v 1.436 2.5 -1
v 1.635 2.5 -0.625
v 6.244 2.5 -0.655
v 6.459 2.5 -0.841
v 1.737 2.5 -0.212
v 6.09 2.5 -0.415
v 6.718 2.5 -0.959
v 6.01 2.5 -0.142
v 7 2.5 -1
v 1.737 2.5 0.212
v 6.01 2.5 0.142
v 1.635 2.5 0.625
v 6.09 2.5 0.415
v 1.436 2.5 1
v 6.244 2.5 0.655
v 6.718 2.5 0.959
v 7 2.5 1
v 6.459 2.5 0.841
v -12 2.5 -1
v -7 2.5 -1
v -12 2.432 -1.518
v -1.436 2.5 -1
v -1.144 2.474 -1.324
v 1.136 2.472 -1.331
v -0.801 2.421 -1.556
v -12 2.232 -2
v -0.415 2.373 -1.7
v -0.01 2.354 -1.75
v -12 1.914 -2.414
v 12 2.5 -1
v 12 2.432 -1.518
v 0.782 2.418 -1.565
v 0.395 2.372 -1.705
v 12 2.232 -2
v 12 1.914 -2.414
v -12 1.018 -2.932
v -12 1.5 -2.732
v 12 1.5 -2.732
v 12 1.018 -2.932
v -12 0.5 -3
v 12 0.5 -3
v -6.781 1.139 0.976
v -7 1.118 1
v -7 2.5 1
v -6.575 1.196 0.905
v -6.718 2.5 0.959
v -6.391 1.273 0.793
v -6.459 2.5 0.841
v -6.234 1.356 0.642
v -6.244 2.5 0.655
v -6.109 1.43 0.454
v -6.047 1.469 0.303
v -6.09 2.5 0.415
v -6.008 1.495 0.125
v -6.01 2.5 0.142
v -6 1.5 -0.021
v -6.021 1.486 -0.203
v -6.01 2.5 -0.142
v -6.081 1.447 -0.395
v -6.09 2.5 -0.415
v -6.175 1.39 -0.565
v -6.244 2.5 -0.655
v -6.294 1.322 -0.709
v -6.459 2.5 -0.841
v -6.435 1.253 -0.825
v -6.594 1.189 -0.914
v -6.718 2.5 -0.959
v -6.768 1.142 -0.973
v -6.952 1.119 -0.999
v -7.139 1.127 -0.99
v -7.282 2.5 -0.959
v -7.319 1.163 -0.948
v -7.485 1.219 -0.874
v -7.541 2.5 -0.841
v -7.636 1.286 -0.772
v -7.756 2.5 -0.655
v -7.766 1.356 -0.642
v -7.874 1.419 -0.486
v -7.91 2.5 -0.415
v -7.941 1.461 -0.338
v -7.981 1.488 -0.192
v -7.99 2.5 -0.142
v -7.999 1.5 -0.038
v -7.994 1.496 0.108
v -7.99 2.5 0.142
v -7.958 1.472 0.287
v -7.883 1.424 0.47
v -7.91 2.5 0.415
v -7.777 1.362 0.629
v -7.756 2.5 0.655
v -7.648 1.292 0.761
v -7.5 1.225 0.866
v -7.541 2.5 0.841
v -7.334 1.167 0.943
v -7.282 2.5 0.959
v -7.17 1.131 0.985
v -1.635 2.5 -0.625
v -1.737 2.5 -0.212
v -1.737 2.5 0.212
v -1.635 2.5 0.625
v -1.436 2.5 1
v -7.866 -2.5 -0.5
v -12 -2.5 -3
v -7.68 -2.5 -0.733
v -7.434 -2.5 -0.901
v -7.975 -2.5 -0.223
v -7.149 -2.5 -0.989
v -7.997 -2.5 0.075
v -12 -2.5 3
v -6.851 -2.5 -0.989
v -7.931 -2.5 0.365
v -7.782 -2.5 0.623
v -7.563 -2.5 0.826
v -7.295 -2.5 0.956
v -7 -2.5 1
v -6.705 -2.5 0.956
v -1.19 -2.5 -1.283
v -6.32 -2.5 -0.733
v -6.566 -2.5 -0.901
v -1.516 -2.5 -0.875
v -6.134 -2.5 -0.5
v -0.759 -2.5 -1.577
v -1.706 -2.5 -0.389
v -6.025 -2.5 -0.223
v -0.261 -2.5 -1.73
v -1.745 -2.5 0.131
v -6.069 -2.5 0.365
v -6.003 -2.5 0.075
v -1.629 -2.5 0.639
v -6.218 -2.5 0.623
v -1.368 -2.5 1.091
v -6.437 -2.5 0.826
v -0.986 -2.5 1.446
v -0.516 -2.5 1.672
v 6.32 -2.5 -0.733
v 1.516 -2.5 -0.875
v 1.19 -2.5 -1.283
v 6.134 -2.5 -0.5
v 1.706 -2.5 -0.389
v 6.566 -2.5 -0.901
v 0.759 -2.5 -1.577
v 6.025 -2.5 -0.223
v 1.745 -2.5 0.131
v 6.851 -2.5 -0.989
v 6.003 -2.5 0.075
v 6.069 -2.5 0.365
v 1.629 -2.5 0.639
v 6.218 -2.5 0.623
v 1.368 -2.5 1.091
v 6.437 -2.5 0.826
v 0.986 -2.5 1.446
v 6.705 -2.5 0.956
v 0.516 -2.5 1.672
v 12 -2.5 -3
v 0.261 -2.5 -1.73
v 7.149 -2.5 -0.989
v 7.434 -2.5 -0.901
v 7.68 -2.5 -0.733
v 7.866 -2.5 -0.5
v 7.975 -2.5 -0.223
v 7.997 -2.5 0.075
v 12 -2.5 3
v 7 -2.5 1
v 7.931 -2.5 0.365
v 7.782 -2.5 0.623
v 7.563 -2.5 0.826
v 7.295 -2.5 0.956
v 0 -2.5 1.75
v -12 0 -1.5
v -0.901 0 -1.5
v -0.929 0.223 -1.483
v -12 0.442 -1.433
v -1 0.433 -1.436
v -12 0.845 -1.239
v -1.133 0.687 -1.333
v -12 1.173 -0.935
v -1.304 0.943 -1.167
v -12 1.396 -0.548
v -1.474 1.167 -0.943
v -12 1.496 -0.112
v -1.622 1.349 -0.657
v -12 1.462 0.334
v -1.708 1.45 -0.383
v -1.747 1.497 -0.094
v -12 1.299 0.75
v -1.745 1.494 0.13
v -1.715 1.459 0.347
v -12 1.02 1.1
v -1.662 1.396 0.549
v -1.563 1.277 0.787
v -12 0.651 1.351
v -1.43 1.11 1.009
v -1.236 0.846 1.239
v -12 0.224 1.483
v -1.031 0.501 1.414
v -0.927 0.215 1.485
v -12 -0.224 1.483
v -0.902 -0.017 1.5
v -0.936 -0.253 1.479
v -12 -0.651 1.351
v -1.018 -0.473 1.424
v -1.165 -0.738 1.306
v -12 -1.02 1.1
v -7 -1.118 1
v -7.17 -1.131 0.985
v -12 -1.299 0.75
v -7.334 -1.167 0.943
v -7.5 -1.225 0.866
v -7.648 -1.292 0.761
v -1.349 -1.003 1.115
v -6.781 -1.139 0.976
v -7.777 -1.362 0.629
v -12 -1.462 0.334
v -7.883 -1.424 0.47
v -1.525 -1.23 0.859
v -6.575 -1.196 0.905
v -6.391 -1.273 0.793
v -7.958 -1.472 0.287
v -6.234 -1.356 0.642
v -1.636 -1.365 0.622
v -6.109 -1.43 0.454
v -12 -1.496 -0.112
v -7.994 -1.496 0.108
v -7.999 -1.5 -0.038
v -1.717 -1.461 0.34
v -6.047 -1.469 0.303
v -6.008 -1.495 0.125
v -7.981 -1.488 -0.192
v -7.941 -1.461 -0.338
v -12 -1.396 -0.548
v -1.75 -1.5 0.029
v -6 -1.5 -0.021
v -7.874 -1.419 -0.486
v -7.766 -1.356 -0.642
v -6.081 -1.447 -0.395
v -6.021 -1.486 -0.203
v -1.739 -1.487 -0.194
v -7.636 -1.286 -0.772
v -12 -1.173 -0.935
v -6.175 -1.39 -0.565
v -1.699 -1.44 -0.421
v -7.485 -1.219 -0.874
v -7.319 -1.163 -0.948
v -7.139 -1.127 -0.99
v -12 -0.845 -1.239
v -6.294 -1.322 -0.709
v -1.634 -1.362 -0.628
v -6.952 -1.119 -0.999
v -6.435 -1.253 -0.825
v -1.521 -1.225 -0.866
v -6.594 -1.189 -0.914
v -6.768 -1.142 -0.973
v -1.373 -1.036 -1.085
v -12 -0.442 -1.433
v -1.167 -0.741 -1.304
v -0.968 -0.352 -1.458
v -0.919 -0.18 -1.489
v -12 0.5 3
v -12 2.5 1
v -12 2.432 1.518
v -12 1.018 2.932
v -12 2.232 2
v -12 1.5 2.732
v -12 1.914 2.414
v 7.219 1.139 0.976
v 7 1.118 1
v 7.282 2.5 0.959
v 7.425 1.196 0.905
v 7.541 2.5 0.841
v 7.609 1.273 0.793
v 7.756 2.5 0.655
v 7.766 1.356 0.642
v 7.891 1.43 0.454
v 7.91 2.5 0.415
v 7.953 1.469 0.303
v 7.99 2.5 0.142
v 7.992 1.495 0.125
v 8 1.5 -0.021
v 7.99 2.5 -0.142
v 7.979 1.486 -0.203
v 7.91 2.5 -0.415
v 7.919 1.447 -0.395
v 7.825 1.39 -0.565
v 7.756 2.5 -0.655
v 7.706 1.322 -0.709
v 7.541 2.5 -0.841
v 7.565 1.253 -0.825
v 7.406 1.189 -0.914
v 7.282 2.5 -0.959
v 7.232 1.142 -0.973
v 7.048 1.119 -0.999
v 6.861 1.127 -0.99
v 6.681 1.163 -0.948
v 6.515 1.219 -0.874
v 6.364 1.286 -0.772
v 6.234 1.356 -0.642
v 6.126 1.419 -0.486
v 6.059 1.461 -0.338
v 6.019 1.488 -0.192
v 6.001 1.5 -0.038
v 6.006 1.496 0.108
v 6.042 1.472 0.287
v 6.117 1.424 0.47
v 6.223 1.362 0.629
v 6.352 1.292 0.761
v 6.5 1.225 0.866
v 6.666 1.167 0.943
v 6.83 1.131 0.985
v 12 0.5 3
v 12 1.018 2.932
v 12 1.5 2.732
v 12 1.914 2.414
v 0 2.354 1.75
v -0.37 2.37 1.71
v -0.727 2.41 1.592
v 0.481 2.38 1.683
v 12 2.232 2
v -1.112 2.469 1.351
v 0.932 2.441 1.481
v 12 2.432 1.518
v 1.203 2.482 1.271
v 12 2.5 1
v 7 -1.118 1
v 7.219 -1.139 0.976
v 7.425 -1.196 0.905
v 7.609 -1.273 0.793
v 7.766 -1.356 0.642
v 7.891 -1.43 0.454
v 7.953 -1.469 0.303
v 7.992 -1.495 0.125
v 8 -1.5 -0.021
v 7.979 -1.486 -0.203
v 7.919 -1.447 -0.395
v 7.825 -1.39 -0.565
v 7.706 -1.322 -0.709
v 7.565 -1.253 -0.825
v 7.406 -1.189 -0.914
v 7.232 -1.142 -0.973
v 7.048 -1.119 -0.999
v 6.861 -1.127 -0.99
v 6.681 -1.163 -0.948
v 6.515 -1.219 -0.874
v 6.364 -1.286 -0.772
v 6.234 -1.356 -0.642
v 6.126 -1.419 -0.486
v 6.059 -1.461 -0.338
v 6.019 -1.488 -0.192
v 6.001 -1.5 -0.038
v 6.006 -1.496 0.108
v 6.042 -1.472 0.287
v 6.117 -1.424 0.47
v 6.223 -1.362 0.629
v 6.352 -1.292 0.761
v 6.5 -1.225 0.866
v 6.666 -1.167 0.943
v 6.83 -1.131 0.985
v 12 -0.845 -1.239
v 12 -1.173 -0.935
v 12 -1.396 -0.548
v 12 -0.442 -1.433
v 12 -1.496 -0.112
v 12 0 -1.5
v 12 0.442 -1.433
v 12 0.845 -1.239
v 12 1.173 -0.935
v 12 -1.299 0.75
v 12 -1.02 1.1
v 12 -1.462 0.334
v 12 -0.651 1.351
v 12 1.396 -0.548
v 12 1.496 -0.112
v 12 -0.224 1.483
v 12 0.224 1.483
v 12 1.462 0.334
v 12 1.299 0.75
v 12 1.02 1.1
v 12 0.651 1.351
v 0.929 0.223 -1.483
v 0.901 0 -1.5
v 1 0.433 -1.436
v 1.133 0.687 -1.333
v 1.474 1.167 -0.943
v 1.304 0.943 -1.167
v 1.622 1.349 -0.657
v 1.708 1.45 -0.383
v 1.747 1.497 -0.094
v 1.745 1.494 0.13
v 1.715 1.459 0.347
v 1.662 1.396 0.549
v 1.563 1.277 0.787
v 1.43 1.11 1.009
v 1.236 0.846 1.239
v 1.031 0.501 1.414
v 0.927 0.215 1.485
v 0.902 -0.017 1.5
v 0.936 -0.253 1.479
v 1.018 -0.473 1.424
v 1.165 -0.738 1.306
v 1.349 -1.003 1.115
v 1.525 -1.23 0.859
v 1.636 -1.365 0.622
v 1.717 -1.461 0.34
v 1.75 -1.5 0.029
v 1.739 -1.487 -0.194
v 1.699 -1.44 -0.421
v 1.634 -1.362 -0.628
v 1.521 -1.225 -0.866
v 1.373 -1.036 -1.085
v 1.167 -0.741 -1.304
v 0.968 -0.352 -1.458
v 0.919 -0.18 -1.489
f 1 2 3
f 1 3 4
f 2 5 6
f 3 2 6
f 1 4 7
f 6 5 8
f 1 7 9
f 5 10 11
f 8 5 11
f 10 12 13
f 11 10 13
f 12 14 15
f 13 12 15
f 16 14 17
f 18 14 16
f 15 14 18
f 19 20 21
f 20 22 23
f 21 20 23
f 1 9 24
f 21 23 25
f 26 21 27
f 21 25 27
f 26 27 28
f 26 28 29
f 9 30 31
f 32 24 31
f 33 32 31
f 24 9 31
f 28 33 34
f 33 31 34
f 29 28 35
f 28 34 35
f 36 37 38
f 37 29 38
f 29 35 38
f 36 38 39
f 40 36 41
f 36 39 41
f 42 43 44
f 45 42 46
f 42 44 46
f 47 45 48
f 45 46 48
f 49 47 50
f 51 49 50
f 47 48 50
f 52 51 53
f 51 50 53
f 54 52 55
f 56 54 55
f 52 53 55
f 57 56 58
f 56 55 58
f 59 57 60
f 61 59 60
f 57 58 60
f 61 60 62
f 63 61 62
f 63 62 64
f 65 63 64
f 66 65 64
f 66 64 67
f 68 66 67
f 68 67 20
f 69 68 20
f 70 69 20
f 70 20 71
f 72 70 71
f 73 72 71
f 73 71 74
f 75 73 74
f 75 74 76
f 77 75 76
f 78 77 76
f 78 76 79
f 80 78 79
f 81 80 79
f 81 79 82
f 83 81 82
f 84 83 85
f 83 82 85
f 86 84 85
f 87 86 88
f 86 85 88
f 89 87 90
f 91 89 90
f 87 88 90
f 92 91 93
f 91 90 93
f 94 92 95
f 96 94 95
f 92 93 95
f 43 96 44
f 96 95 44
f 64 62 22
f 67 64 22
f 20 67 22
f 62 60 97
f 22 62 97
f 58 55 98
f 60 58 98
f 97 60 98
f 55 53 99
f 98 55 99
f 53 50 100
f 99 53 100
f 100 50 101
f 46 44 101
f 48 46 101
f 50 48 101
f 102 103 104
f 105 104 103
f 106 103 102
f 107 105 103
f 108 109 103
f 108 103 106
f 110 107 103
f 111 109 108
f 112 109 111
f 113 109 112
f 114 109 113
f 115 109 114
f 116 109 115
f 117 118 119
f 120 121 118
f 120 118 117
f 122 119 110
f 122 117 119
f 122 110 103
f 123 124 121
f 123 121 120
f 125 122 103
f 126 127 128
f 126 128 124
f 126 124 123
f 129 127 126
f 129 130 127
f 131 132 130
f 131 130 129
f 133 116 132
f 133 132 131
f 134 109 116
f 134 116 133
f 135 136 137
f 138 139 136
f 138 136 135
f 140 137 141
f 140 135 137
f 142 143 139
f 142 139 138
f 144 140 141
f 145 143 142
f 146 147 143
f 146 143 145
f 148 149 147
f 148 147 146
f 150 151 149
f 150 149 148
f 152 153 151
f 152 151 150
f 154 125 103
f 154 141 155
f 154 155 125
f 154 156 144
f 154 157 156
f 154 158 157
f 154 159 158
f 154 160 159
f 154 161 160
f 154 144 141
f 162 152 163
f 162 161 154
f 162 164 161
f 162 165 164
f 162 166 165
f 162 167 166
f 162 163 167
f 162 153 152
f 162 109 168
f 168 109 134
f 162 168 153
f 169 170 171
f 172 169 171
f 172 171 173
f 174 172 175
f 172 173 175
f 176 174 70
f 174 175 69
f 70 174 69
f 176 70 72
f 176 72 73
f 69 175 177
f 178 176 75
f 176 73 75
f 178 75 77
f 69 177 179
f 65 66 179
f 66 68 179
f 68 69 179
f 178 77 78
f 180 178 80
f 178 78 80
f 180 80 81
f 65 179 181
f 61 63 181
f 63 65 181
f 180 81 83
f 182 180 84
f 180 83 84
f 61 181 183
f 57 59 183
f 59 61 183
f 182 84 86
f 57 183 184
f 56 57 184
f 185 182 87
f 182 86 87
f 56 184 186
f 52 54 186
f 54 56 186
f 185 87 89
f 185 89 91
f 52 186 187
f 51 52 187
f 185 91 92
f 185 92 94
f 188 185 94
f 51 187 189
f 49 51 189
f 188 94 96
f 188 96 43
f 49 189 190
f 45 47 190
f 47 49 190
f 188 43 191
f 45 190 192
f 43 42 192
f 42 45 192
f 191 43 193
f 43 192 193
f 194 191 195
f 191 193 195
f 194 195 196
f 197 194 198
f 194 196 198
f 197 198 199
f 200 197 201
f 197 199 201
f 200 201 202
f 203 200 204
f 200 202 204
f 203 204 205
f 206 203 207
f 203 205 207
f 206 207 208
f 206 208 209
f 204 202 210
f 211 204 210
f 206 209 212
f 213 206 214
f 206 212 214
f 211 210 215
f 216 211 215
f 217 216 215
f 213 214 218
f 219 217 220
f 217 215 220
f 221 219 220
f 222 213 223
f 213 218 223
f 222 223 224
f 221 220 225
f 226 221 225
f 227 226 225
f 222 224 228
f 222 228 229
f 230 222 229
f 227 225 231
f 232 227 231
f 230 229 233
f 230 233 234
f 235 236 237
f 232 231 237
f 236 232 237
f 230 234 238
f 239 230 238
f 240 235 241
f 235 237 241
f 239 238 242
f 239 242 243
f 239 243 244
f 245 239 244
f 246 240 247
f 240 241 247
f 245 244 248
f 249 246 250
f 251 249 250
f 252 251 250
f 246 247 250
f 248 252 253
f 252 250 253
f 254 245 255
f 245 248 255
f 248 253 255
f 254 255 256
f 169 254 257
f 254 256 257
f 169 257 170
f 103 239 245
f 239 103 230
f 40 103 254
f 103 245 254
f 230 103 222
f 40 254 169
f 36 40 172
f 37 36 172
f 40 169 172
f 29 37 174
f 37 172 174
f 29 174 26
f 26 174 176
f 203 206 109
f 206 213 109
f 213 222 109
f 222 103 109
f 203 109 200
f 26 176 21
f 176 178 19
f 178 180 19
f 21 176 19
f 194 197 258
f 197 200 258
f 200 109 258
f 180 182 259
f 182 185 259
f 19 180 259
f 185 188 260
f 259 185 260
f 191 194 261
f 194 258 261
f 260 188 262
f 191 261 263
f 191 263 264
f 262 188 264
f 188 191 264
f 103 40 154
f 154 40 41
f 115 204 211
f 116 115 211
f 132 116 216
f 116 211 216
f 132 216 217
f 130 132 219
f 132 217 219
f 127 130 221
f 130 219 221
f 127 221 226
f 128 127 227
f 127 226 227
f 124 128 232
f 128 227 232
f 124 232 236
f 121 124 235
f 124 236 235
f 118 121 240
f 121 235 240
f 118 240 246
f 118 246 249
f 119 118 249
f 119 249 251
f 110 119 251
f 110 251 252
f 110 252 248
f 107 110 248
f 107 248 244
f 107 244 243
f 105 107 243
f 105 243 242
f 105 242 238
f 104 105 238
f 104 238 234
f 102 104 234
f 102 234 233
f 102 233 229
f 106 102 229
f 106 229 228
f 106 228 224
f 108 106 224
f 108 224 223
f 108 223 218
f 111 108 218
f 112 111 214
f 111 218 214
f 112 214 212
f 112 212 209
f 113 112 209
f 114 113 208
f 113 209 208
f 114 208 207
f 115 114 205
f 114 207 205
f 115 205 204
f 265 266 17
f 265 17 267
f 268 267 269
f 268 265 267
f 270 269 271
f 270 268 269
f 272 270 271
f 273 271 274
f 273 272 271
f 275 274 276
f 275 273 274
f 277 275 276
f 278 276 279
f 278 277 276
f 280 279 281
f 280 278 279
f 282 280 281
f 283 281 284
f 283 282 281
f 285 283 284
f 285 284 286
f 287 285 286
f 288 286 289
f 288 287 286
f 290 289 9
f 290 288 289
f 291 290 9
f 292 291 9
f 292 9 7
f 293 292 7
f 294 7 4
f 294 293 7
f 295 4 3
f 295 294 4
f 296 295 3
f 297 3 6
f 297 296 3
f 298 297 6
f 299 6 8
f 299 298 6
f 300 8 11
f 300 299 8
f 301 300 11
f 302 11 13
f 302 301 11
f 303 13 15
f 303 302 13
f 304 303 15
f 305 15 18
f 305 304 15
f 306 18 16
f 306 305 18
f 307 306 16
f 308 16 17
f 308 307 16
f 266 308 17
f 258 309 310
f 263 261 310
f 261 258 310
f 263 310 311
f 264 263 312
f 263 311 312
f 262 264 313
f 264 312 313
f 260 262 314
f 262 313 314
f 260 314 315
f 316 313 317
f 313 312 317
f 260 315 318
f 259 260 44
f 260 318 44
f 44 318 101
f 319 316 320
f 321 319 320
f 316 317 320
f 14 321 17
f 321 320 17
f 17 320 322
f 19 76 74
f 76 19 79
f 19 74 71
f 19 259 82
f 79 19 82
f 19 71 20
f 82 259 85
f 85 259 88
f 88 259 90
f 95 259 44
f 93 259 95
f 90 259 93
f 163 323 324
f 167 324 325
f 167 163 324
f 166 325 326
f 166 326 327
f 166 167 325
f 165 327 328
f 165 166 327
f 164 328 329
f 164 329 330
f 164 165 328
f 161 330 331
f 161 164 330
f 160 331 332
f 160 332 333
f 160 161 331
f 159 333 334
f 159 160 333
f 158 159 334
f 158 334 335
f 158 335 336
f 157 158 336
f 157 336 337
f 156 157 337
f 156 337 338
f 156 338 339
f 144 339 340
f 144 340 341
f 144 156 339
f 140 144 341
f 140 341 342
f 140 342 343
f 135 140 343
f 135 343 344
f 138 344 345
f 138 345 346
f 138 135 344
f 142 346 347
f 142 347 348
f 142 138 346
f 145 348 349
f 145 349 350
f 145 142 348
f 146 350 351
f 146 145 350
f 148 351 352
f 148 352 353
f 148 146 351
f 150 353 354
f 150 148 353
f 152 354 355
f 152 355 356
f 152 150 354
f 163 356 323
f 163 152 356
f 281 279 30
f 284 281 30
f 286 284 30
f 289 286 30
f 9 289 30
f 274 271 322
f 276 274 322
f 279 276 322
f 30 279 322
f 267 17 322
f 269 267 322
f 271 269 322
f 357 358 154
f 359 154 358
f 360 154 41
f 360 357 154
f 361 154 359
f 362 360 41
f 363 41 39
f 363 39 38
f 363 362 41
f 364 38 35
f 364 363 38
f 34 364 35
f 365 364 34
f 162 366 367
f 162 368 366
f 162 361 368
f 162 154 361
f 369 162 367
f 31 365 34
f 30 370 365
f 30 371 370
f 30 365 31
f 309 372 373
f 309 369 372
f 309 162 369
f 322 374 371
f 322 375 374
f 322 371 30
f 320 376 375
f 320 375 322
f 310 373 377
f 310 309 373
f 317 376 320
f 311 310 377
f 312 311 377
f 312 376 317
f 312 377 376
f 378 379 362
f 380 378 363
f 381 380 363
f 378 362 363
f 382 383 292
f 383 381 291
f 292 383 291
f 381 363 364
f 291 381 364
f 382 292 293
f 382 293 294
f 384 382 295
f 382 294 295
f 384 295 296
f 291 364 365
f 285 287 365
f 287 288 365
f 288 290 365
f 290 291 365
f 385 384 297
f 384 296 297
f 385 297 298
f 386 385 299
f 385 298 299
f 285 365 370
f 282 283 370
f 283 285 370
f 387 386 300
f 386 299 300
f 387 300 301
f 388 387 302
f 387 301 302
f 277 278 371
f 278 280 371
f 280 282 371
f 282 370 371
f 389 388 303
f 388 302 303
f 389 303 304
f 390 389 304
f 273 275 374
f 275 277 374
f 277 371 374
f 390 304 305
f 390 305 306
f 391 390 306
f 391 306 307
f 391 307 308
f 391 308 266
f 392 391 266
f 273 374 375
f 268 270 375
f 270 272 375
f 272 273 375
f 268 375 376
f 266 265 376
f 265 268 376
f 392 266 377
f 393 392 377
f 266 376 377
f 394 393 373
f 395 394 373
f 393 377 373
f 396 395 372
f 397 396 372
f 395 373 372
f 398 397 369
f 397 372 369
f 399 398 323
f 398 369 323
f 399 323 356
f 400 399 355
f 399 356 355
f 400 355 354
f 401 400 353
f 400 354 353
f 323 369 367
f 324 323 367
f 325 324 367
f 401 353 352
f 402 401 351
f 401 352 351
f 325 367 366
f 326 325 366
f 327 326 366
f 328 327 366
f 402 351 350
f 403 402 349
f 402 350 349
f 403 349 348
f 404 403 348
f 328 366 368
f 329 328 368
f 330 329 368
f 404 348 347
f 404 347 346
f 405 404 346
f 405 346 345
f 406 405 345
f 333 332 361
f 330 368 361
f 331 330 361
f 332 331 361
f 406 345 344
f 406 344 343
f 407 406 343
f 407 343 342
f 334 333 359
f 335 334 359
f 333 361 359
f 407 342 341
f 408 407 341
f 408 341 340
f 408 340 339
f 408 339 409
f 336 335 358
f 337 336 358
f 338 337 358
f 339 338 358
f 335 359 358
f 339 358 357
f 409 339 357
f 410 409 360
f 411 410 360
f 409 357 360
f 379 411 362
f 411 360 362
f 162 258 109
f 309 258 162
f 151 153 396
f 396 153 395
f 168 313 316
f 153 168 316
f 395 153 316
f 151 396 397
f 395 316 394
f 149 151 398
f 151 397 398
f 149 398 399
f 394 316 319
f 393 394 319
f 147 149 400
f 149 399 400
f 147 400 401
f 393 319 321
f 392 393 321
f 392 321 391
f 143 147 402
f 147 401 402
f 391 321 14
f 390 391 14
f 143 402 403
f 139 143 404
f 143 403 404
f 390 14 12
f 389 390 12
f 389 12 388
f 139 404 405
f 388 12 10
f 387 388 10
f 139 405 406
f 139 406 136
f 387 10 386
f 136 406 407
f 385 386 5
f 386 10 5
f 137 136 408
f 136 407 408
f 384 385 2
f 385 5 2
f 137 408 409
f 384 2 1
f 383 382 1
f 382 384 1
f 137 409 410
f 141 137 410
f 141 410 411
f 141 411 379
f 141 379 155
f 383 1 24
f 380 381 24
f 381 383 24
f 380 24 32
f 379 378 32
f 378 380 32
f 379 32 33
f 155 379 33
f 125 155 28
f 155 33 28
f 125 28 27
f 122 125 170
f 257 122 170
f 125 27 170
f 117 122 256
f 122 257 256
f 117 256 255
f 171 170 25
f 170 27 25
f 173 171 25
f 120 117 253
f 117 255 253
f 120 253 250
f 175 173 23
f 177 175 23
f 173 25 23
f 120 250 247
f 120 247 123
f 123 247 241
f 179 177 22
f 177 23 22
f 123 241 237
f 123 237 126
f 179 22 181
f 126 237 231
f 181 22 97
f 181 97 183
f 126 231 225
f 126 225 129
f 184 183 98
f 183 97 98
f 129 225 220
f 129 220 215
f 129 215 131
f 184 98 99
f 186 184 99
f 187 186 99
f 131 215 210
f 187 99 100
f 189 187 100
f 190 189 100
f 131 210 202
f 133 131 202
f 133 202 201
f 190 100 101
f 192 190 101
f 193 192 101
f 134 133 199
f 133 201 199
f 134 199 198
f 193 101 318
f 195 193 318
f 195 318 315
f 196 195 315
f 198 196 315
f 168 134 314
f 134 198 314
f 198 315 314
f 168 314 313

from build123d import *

# Parameters (mm, degrees)
SKETCH_1_W          = 24
SKETCH_1_H          = 5
EXTRUDE_1_DEPTH     = 3
SKETCH_2_R          = 1.5
CUT_EXTRUDE_1_DEPTH = 25.315632832
SKETCH_3_R          = 1.75
CUT_EXTRUDE_2_DEPTH = 14.341664064
SKETCH_4_R          = 1
CUT_EXTRUDE_3_DEPTH = 14.341664192
SKETCH_5_R          = 1
EXTRUDE_3_DEPTH     = 2
SKETCH_6_W          = 2
SKETCH_6_H          = 0.5
CUT_EXTRUDE_7_DEPTH = 3
CUT_EXTRUDE_START   = -10
SKETCH_8_R          = 1
CUT_EXTRUDE_9_DEPTH = 10
FILLET_2_R          = 2


with BuildPart() as part:
    # 草图1 → 凸台-拉伸1 (new, symmetric)
    with BuildSketch(Plane.XY):
        Rectangle(SKETCH_1_W, SKETCH_1_H)
    extrude(amount=EXTRUDE_1_DEPTH, both=True)

    # 草图2 → 切除-拉伸1 (cut, through all)
    with BuildSketch(Plane(origin=(12, 0, 0), x_dir=(0, 0, -1), z_dir=(1, 0, 0))):
        Circle(SKETCH_2_R)
    extrude(amount=-CUT_EXTRUDE_1_DEPTH, mode=Mode.SUBTRACT)

    # 草图3 → 切除-拉伸2 (cut, through all)
    with BuildSketch(Plane(origin=(0, 2.5, 0), x_dir=(1, 0, 0), z_dir=(0, 1, 0))):
        with Locations(Location((0, 0, 0), (0, 0, 270))):
            Circle(SKETCH_3_R)
    extrude(amount=-CUT_EXTRUDE_2_DEPTH, mode=Mode.SUBTRACT)

    # 草图4 → 切除-拉伸3 (cut, through all)
    with BuildSketch(Plane(origin=(0, 2.5, 0), x_dir=(1, 0, 0), z_dir=(0, 1, 0))):
        with Locations(Location((-7, 0, 0), (0, 0, 270))):
            Circle(SKETCH_4_R)
    extrude(amount=-CUT_EXTRUDE_3_DEPTH, mode=Mode.SUBTRACT)

    # 草图5 → 凸台-拉伸3 (add)
    with BuildSketch(Plane(origin=(0, 2.5, 0), x_dir=(1, 0, 0), z_dir=(0, 1, 0))):
        with Locations(Location((7, 0, 0), (0, 0, 270))):
            Circle(SKETCH_5_R)
    extrude(amount=EXTRUDE_3_DEPTH)

    # 草图6 → 切除-拉伸7 (cut)
    with BuildSketch(Plane(origin=(0, 0, -3), x_dir=(-1, 0, 0), z_dir=(0, 0, -1))):
        with Locations((-7, 3.25)):
            Rectangle(SKETCH_6_W, SKETCH_6_H)
    extrude(amount=-CUT_EXTRUDE_7_DEPTH, mode=Mode.SUBTRACT)

    # 草图8 → 切除-拉伸9 (cut)
    with BuildSketch(Plane(origin=(0, 4.5, 0), x_dir=(1, 0, 0), z_dir=(0, 1, 0)).offset(CUT_EXTRUDE_START)):
        with Locations(Location((7, 0, 0), (0, 0, 270))):
            Circle(SKETCH_8_R)
    extrude(amount=CUT_EXTRUDE_9_DEPTH, mode=Mode.SUBTRACT)

    # 圆角2
    # the kernel refuses this fillet: 2 mm, written as the material it takes off along each edge
    with BuildSketch(Plane(origin=(17, 2.5, -3), x_dir=(0, -1, 0), z_dir=(-1, 0, 0))) as fillet_2_piece_1:
        with BuildLine():
            CenterArc((FILLET_2_R, FILLET_2_R), FILLET_2_R, 180, 90)
            Line((0, FILLET_2_R), (0, 0))
            Line((0, 0), (FILLET_2_R, 0))
        make_face()
    extrude(amount=34, mode=Mode.SUBTRACT)
    with BuildSketch(Plane(origin=(17, 2.5, 3), x_dir=(0, -1, 0), z_dir=(-1, 0, 0))) as fillet_2_piece_2:
        with BuildLine():
            CenterArc((FILLET_2_R, -FILLET_2_R), FILLET_2_R, 90, 90)
            Line((0, -FILLET_2_R), (0, 0))
            Line((0, 0), (FILLET_2_R, 0))
        make_face()
    extrude(amount=34, mode=Mode.SUBTRACT)


solid = part.part
